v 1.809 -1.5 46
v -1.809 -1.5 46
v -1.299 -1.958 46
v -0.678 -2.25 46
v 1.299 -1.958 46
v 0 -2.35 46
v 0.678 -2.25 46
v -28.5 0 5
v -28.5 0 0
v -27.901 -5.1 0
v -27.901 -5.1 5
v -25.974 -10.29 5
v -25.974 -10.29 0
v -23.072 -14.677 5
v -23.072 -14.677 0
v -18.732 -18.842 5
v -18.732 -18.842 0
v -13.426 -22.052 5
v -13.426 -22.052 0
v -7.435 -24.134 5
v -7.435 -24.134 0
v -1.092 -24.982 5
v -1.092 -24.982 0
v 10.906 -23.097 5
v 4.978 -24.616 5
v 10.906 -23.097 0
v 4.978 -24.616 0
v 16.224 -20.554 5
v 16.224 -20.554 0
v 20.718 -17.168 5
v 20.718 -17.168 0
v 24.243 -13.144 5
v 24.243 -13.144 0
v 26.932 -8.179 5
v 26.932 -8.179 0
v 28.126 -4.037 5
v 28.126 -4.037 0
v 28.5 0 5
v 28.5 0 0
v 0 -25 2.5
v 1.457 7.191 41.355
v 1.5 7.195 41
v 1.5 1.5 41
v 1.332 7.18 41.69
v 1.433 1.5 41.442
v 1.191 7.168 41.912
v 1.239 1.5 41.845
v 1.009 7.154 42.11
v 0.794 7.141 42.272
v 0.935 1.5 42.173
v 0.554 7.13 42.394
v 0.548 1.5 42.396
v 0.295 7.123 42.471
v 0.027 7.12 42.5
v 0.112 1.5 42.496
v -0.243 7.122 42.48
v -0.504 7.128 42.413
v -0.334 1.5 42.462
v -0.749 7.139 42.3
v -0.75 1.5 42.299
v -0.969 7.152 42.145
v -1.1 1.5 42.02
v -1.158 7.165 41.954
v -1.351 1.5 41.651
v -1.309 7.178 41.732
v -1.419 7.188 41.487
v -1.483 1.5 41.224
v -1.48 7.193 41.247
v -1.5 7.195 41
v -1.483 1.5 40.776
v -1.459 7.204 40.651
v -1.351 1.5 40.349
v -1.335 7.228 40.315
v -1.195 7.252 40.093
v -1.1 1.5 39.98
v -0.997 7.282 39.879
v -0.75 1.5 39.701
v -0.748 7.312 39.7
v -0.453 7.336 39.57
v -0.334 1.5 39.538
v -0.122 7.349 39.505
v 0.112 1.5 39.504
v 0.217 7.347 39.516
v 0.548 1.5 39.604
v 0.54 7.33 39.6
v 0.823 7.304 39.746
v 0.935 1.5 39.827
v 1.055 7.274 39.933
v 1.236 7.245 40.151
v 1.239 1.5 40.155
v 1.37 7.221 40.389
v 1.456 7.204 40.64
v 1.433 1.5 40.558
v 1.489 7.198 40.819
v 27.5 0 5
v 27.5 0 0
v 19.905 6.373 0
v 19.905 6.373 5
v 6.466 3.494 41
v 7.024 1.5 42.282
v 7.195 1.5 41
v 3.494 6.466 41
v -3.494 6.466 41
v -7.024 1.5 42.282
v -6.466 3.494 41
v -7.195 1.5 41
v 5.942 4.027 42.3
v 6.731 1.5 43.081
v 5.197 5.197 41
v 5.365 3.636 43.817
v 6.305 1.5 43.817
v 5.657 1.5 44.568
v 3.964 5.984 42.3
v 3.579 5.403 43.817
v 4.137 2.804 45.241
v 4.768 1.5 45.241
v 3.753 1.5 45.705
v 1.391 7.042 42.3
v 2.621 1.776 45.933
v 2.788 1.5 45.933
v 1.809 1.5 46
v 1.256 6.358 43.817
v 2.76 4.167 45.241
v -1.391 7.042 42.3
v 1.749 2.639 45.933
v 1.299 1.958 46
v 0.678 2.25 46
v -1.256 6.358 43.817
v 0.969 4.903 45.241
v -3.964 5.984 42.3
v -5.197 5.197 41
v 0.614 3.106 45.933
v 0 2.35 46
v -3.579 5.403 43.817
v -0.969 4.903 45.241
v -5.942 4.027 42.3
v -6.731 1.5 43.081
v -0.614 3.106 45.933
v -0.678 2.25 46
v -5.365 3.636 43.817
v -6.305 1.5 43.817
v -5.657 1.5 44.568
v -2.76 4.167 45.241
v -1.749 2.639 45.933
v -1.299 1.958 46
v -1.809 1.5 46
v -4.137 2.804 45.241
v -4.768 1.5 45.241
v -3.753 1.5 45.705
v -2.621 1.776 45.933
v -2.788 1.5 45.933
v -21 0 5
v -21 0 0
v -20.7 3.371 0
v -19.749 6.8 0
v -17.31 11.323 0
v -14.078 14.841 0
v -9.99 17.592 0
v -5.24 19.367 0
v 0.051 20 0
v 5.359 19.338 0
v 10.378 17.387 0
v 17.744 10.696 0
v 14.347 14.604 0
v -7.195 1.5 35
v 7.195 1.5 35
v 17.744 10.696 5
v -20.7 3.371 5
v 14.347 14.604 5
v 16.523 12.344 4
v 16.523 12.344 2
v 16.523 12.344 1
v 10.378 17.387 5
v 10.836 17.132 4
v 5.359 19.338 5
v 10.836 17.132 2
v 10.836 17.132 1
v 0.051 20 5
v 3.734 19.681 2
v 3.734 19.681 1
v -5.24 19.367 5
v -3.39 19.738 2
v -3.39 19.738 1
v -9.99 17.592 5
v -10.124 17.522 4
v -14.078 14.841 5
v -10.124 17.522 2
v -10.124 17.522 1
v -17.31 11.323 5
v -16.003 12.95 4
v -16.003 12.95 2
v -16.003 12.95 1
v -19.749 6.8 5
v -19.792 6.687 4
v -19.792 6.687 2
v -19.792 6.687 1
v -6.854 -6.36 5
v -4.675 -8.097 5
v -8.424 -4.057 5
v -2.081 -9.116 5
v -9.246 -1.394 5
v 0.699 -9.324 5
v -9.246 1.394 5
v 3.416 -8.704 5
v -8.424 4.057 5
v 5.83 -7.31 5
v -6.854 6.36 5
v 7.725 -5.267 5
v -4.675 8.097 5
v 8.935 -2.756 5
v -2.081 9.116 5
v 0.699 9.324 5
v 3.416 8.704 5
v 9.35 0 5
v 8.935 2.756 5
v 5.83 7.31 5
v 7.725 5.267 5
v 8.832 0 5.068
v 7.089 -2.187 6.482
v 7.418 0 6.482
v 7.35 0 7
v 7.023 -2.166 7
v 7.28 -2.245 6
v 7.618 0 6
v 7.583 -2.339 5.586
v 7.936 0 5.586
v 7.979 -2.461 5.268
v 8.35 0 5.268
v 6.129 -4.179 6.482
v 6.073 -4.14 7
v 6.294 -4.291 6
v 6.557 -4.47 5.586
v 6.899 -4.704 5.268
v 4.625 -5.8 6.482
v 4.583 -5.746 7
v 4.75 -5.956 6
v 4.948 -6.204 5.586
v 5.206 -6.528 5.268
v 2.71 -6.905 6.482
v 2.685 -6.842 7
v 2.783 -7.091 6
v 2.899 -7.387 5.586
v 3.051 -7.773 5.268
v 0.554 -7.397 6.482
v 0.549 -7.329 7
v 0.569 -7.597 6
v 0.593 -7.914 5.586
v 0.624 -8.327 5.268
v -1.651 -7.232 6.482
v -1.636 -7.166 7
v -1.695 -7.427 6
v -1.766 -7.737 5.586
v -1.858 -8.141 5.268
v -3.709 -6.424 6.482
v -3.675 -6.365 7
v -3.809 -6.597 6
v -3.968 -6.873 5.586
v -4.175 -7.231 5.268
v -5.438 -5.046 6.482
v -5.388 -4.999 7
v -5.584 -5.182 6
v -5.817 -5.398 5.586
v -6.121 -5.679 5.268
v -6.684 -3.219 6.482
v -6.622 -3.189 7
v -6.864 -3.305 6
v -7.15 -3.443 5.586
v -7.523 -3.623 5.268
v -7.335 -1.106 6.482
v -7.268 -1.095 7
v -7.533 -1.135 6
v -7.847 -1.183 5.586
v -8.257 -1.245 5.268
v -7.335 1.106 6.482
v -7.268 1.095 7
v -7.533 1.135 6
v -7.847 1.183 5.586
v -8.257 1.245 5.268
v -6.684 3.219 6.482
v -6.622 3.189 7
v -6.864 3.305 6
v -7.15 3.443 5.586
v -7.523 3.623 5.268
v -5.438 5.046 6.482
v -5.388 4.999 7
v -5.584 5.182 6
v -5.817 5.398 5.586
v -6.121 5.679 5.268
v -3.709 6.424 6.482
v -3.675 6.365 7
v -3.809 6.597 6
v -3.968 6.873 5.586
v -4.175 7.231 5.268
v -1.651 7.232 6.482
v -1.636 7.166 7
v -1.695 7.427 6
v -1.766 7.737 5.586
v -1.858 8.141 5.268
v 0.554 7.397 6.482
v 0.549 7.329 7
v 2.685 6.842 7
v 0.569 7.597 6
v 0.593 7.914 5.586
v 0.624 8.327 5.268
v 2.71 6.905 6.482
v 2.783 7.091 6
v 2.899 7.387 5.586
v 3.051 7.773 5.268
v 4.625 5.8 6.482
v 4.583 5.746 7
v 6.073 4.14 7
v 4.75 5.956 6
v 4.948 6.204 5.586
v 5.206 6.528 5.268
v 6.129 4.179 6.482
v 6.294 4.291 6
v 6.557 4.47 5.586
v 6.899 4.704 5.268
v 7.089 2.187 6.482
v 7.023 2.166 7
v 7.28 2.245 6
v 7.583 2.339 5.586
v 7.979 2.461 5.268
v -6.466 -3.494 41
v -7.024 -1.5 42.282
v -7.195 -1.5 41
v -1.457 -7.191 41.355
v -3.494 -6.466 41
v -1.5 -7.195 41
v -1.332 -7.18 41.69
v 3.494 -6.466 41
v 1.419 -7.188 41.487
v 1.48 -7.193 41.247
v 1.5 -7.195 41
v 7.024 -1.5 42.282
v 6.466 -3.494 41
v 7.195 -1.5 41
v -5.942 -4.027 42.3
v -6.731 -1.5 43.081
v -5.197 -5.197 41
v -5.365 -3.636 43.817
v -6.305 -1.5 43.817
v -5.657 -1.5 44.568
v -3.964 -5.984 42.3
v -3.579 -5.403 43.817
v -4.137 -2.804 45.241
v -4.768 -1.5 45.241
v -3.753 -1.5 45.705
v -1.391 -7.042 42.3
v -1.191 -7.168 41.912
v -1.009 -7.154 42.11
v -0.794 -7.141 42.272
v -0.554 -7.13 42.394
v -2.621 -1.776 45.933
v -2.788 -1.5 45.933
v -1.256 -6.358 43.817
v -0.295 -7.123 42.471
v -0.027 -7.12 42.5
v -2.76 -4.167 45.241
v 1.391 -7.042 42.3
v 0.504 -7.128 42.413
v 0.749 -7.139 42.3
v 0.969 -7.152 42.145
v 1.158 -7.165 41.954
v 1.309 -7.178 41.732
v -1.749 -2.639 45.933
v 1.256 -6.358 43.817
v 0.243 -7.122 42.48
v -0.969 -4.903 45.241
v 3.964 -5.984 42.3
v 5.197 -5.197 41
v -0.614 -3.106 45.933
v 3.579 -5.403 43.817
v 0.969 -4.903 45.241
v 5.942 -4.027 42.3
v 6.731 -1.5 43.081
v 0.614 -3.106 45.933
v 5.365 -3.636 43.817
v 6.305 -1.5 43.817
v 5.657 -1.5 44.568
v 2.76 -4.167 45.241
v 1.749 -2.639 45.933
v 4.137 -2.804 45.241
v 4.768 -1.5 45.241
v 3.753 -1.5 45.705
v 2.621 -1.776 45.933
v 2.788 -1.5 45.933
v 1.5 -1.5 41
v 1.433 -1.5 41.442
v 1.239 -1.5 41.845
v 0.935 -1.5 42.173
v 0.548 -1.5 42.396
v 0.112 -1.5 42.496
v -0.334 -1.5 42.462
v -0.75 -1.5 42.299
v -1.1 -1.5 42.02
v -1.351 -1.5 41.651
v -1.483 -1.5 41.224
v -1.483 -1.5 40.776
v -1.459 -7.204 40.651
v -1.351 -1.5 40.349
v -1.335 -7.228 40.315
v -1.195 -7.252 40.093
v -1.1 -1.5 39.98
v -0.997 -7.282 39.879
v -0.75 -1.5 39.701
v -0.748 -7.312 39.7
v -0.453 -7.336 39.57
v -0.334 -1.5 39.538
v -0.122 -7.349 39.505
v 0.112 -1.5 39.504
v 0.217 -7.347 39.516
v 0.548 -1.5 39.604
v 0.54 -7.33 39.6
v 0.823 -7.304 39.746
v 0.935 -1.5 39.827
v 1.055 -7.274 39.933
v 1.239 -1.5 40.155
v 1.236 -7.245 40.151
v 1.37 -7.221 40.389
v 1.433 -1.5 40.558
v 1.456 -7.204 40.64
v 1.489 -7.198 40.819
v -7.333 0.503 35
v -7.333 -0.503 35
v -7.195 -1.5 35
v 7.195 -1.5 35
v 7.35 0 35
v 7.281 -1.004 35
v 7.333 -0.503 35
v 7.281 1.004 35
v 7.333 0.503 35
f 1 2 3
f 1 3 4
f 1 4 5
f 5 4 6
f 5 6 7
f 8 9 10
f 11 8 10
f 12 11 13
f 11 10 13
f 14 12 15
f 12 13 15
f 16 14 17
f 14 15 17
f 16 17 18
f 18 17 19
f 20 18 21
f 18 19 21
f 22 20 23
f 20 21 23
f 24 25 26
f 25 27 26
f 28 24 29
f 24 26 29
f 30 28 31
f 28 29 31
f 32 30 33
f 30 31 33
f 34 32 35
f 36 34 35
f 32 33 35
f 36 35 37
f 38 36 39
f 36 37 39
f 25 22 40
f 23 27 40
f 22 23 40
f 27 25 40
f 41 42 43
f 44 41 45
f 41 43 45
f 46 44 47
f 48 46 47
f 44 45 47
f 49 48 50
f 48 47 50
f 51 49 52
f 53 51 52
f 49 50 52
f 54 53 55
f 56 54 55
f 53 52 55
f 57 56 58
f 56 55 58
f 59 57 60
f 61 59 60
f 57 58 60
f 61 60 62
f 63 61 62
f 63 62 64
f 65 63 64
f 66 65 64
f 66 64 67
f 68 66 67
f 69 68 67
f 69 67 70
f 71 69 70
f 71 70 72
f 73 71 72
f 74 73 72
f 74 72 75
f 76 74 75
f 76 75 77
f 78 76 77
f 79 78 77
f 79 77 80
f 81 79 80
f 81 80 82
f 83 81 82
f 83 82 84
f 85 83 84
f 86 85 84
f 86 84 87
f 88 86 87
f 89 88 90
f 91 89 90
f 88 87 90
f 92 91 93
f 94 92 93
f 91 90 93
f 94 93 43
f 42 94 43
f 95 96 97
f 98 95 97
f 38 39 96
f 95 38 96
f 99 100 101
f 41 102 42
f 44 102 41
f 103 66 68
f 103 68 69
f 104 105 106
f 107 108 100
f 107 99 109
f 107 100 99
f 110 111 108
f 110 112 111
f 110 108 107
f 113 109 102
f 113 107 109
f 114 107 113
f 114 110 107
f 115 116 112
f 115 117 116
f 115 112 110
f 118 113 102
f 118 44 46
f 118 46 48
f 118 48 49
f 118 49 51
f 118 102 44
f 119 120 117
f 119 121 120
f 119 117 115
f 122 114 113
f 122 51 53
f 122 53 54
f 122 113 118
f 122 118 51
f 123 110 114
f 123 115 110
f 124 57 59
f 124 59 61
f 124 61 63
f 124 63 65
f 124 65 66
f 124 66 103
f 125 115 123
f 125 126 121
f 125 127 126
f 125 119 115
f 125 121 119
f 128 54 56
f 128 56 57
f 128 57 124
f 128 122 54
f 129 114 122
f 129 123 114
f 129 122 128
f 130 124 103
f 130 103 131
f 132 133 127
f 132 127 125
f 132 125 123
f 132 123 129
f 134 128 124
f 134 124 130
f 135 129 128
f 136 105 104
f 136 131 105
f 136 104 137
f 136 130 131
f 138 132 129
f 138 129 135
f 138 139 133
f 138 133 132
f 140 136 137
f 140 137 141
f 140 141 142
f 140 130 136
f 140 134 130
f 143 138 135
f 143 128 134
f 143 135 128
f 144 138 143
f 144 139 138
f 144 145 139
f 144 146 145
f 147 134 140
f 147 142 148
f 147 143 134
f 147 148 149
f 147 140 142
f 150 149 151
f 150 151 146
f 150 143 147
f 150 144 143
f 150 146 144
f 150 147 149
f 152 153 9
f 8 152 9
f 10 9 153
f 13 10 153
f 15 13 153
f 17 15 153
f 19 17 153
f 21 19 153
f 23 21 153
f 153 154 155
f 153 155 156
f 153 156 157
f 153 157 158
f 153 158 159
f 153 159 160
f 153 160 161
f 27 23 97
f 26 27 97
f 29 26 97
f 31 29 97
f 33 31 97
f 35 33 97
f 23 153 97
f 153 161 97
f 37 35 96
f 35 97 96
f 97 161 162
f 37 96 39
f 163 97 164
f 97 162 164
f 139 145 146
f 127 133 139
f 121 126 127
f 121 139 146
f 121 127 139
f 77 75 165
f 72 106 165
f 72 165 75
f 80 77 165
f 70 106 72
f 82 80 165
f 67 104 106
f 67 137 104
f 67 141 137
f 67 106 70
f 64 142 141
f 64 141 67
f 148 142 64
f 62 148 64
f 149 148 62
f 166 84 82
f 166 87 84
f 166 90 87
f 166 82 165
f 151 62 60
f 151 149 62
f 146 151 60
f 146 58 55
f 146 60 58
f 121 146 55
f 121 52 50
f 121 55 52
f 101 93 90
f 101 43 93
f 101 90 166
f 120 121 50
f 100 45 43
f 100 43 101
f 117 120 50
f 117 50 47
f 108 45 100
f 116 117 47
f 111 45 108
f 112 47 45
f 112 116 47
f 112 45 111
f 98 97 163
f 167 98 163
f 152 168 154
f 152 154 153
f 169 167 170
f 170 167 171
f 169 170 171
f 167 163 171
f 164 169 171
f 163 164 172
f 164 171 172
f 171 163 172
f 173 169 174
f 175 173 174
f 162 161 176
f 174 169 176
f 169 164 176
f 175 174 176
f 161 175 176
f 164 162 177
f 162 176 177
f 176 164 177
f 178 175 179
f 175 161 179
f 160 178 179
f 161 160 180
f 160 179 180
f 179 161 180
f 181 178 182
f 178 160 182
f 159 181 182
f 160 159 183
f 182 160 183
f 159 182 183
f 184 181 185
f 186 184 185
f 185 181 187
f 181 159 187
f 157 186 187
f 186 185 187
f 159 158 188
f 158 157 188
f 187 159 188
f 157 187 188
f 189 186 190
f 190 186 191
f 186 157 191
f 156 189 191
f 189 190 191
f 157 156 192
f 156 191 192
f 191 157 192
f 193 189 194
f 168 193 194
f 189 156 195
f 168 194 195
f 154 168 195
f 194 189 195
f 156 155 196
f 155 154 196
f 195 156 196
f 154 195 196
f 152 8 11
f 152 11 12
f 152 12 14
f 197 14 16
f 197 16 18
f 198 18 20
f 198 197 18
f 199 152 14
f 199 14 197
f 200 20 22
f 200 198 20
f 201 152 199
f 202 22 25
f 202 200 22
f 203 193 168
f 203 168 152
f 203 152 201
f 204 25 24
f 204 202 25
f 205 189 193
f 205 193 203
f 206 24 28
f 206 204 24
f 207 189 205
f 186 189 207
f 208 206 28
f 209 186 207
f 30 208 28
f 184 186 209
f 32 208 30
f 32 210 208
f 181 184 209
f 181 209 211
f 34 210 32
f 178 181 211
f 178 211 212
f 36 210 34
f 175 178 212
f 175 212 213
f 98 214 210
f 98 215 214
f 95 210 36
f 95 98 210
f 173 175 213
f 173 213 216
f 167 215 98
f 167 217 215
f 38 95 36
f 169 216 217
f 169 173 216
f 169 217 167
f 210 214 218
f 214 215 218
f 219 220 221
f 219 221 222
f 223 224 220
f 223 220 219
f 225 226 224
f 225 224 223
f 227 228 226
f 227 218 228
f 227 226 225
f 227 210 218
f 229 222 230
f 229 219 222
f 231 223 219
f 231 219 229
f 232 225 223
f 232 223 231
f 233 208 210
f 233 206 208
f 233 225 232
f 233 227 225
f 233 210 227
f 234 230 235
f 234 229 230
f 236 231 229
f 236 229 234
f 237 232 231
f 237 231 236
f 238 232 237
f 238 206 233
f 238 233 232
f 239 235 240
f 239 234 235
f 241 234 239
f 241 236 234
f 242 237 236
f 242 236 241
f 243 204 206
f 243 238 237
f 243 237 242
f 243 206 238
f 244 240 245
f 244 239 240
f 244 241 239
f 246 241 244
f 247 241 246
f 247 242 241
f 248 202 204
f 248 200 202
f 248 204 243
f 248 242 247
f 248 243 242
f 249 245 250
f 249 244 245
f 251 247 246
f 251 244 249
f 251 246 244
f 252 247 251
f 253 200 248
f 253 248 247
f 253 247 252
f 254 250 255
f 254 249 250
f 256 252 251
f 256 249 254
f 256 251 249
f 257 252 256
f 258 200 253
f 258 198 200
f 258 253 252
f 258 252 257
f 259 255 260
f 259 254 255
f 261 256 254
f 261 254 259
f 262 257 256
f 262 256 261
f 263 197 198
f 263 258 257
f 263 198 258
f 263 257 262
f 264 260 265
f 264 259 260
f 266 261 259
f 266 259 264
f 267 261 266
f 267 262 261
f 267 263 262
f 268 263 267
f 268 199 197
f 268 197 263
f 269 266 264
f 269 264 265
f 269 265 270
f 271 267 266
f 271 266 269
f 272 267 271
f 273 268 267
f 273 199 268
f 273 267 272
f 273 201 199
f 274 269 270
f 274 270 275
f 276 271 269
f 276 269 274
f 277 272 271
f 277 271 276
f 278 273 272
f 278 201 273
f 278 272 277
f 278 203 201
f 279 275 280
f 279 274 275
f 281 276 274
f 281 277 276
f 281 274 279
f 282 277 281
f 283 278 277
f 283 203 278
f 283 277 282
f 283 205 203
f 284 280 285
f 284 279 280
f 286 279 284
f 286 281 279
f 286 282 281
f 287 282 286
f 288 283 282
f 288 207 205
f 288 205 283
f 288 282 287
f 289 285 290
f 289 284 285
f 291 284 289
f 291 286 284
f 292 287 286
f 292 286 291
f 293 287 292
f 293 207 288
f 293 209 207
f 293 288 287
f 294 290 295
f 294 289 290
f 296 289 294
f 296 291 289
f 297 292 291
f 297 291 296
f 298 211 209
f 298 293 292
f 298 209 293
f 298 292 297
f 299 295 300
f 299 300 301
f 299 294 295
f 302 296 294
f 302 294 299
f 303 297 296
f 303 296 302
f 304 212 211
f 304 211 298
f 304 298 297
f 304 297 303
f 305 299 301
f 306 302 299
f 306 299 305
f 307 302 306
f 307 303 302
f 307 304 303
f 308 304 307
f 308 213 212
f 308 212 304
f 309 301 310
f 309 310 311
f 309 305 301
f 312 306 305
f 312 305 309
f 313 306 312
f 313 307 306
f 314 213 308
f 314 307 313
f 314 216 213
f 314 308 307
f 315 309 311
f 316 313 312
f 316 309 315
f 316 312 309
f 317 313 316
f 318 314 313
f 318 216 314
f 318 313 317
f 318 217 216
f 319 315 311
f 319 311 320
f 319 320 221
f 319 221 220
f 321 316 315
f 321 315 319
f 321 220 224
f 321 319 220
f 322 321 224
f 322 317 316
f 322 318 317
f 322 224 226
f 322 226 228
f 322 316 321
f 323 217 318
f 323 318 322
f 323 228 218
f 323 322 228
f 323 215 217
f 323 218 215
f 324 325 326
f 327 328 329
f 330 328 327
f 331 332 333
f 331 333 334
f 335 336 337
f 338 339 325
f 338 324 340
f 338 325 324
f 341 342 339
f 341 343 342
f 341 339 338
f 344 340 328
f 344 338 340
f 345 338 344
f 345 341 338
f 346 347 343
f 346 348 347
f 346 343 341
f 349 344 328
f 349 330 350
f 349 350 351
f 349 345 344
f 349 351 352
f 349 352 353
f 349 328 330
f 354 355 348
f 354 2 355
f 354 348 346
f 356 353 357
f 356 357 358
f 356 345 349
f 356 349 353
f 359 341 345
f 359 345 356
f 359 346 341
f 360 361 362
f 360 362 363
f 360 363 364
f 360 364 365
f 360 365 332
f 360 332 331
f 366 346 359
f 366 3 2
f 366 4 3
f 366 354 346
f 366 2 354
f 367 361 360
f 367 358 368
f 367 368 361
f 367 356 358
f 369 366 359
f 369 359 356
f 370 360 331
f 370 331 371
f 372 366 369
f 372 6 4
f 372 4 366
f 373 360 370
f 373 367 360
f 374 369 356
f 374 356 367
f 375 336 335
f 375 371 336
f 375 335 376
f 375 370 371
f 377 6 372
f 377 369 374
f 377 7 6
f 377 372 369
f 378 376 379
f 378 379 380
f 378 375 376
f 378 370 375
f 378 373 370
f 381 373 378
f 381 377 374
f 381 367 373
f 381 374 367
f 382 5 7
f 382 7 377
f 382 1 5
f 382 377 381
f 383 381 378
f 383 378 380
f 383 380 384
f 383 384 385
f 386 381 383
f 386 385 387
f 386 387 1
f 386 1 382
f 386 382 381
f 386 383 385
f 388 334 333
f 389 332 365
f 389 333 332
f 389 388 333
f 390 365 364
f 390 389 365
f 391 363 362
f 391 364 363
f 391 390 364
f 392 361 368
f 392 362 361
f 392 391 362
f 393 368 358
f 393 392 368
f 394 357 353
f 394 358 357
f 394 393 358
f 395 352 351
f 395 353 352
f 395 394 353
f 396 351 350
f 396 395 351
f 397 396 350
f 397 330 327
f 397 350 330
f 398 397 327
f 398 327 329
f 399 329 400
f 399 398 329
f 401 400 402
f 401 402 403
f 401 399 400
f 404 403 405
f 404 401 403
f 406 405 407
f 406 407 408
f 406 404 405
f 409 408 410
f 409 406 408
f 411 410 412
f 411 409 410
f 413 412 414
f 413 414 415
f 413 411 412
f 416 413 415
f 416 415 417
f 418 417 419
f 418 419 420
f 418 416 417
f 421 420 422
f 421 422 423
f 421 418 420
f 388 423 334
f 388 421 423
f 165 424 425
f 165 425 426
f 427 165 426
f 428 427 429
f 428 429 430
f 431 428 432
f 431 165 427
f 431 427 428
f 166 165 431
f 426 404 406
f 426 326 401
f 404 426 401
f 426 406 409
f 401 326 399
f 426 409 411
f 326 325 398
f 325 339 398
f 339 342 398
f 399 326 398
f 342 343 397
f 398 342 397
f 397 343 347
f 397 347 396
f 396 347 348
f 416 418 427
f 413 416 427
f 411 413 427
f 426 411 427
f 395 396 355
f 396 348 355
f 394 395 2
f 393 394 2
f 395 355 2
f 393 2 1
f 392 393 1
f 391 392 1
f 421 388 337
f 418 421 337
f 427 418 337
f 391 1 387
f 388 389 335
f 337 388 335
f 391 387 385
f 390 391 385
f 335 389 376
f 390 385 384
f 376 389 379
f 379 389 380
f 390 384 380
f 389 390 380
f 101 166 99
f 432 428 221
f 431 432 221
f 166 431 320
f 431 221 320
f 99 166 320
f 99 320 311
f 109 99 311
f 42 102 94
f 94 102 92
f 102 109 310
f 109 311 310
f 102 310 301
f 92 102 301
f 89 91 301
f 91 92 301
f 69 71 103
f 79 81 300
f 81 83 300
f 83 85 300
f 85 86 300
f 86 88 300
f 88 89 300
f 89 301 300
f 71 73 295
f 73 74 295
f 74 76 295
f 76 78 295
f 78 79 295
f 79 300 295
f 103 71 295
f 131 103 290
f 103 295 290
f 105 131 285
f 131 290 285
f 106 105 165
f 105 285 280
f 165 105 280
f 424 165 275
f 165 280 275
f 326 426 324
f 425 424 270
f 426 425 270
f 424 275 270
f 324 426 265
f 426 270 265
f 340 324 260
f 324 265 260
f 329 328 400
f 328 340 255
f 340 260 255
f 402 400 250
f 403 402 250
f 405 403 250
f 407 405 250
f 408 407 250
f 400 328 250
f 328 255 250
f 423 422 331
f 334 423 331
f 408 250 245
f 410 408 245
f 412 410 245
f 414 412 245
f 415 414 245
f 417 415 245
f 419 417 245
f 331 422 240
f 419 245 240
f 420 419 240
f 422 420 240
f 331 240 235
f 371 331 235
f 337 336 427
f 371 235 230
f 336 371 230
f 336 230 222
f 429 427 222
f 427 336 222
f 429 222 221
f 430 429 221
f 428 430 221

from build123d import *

# Parameters (mm, degrees)
F0_R          = 9
F0_R_2        = 7.35
F1_DEPTH      = 5
F2_DEPTH      = 46
F3_W          = 14.3906219463
F3_H          = 3
F4_DEPTH      = 11
F5_R          = 5
F6_R          = 1.5
F7_DEPTH      = 25
F7_DEPTH_BACK = 25
F8_R          = 2


# Not quite as in the source:
# - a feature names something its author has since deleted; it is built from what else it names


with BuildPart() as f1:
    # F0 (on Top) → F1 (new body)
    with BuildSketch(Plane.XY):
        with BuildLine():
            add(Edge.make_bspline(
                [(19.9054758651, 6.3725624005), (14.2198809993, 22.4810875589), (-3.3900595004, 19.737678704), (-21, 16.994269849), (-21, 0)],
                knots=[3.4658744739, 3.4658744739, 3.4658744739, 4.8745298905, 4.8745298905, 6.2831853072, 6.2831853072, 6.2831853072], degree=2, weights=[1, 0.7620470474, 1, 0.7620470474, 1]))
            add(Edge.make_bspline(
                [(-21, 0), (-21, -20), (0, -20), (21, -20), (21, 0)],
                knots=[0, 0, 0, 1.5707963268, 1.5707963268, 3.1415926536, 3.1415926536, 3.1415926536], degree=2, weights=[1, 0.7071067812, 1, 0.7071067812, 1]))
            add(Edge.make_bspline(
                [(21, 0), (21, 3.2715377973), (19.9054758651, 6.3725624005)],
                knots=[3.1415926536, 3.1415926536, 3.1415926536, 3.4658744739, 3.4658744739, 3.4658744739], degree=2, weights=[1, 0.9868839352, 1]))
        make_face()
        Circle(F0_R, mode=Mode.SUBTRACT)
        with BuildLine():
            add(Edge.make_bspline(
                [(-28.5, 0), (-28.5, -25), (0, -25), (28.5, -25), (28.5, 0)],
                knots=[3.1415926536, 3.1415926536, 3.1415926536, 4.7123889804, 4.7123889804, 6.2831853072, 6.2831853072, 6.2831853072], degree=2, weights=[1, 0.7071067812, 1, 0.7071067812, 1]))
            Line((28.5, 0), (27.5, 0))
            Line((27.5, 0), (21, 0))
            add(Edge.make_bspline(
                [(-21, 0), (-21, -20), (0, -20), (21, -20), (21, 0)],
                knots=[0, 0, 0, 1.5707963268, 1.5707963268, 3.1415926536, 3.1415926536, 3.1415926536], degree=2, weights=[1, 0.7071067812, 1, 0.7071067812, 1]))
            Line((-21, 0), (-28.5, 0))
        make_face()
        Circle(F0_R)
        Circle(F0_R_2, mode=Mode.SUBTRACT)
        Circle(F0_R_2)
        with BuildLine():
            Line((21, 0), (27.5, 0))
            Line((27.5, 0), (19.9054758651, 6.3725624005))
            add(Edge.make_bspline(
                [(21, 0), (21, 3.2715377973), (19.9054758651, 6.3725624005)],
                knots=[3.1415926536, 3.1415926536, 3.1415926536, 3.4658744739, 3.4658744739, 3.4658744739], degree=2, weights=[1, 0.9868839352, 1]))
        make_face()
    extrude(amount=F1_DEPTH)

    # F0 (on Top) → F2 (join)
    with BuildSketch(Plane.XY):
        Circle(F0_R_2)
    extrude(amount=F2_DEPTH)

    # F3 (on face) → F4 (cut)
    with BuildSketch(Plane.XY.offset(46)):
        Rectangle(F3_W, F3_H)
        with BuildLine():
            Line((-7.1953109731, -1.5), (-7.1953109731, 1.5))
            ThreePointArc((-7.1953109731, 1.5), (-7.35, 0), (-7.1953109731, -1.5))
        make_face()
        with BuildLine():
            ThreePointArc((7.35, 0), (7.3112254668, 0.7539775685), (7.1953109731, 1.5))
            Line((7.1953109731, 1.5), (7.1953109731, -1.5))
            ThreePointArc((7.1953109731, -1.5), (7.3112254668, -0.7539775685), (7.35, 0))
        make_face()
    extrude(amount=-F4_DEPTH, mode=Mode.SUBTRACT)

    # F5
    f5_edges = [f1.edges().sort_by_distance(p)[0] for p in [
        (0, -7.35, 46),
        (0, 7.35, 46),
    ]]
    fillet(f5_edges, radius=F5_R)

    # F6 (on face) → F7 (cut, two sides)
    with BuildSketch(Plane.XZ.offset(-1.5)) as f7_sk:
        with Locations((0, 41)):
            Circle(F6_R)
    extrude(amount=-F7_DEPTH, mode=Mode.SUBTRACT)
    extrude(f7_sk.sketch, amount=F7_DEPTH_BACK, mode=Mode.SUBTRACT)

    # F8
    f8_edges = [f1.edges().sort_by_distance(p)[0] for p in [
        (-7.35, 0, 5),
    ]]
    fillet(f8_edges, radius=F8_R)


solid = f1.part
